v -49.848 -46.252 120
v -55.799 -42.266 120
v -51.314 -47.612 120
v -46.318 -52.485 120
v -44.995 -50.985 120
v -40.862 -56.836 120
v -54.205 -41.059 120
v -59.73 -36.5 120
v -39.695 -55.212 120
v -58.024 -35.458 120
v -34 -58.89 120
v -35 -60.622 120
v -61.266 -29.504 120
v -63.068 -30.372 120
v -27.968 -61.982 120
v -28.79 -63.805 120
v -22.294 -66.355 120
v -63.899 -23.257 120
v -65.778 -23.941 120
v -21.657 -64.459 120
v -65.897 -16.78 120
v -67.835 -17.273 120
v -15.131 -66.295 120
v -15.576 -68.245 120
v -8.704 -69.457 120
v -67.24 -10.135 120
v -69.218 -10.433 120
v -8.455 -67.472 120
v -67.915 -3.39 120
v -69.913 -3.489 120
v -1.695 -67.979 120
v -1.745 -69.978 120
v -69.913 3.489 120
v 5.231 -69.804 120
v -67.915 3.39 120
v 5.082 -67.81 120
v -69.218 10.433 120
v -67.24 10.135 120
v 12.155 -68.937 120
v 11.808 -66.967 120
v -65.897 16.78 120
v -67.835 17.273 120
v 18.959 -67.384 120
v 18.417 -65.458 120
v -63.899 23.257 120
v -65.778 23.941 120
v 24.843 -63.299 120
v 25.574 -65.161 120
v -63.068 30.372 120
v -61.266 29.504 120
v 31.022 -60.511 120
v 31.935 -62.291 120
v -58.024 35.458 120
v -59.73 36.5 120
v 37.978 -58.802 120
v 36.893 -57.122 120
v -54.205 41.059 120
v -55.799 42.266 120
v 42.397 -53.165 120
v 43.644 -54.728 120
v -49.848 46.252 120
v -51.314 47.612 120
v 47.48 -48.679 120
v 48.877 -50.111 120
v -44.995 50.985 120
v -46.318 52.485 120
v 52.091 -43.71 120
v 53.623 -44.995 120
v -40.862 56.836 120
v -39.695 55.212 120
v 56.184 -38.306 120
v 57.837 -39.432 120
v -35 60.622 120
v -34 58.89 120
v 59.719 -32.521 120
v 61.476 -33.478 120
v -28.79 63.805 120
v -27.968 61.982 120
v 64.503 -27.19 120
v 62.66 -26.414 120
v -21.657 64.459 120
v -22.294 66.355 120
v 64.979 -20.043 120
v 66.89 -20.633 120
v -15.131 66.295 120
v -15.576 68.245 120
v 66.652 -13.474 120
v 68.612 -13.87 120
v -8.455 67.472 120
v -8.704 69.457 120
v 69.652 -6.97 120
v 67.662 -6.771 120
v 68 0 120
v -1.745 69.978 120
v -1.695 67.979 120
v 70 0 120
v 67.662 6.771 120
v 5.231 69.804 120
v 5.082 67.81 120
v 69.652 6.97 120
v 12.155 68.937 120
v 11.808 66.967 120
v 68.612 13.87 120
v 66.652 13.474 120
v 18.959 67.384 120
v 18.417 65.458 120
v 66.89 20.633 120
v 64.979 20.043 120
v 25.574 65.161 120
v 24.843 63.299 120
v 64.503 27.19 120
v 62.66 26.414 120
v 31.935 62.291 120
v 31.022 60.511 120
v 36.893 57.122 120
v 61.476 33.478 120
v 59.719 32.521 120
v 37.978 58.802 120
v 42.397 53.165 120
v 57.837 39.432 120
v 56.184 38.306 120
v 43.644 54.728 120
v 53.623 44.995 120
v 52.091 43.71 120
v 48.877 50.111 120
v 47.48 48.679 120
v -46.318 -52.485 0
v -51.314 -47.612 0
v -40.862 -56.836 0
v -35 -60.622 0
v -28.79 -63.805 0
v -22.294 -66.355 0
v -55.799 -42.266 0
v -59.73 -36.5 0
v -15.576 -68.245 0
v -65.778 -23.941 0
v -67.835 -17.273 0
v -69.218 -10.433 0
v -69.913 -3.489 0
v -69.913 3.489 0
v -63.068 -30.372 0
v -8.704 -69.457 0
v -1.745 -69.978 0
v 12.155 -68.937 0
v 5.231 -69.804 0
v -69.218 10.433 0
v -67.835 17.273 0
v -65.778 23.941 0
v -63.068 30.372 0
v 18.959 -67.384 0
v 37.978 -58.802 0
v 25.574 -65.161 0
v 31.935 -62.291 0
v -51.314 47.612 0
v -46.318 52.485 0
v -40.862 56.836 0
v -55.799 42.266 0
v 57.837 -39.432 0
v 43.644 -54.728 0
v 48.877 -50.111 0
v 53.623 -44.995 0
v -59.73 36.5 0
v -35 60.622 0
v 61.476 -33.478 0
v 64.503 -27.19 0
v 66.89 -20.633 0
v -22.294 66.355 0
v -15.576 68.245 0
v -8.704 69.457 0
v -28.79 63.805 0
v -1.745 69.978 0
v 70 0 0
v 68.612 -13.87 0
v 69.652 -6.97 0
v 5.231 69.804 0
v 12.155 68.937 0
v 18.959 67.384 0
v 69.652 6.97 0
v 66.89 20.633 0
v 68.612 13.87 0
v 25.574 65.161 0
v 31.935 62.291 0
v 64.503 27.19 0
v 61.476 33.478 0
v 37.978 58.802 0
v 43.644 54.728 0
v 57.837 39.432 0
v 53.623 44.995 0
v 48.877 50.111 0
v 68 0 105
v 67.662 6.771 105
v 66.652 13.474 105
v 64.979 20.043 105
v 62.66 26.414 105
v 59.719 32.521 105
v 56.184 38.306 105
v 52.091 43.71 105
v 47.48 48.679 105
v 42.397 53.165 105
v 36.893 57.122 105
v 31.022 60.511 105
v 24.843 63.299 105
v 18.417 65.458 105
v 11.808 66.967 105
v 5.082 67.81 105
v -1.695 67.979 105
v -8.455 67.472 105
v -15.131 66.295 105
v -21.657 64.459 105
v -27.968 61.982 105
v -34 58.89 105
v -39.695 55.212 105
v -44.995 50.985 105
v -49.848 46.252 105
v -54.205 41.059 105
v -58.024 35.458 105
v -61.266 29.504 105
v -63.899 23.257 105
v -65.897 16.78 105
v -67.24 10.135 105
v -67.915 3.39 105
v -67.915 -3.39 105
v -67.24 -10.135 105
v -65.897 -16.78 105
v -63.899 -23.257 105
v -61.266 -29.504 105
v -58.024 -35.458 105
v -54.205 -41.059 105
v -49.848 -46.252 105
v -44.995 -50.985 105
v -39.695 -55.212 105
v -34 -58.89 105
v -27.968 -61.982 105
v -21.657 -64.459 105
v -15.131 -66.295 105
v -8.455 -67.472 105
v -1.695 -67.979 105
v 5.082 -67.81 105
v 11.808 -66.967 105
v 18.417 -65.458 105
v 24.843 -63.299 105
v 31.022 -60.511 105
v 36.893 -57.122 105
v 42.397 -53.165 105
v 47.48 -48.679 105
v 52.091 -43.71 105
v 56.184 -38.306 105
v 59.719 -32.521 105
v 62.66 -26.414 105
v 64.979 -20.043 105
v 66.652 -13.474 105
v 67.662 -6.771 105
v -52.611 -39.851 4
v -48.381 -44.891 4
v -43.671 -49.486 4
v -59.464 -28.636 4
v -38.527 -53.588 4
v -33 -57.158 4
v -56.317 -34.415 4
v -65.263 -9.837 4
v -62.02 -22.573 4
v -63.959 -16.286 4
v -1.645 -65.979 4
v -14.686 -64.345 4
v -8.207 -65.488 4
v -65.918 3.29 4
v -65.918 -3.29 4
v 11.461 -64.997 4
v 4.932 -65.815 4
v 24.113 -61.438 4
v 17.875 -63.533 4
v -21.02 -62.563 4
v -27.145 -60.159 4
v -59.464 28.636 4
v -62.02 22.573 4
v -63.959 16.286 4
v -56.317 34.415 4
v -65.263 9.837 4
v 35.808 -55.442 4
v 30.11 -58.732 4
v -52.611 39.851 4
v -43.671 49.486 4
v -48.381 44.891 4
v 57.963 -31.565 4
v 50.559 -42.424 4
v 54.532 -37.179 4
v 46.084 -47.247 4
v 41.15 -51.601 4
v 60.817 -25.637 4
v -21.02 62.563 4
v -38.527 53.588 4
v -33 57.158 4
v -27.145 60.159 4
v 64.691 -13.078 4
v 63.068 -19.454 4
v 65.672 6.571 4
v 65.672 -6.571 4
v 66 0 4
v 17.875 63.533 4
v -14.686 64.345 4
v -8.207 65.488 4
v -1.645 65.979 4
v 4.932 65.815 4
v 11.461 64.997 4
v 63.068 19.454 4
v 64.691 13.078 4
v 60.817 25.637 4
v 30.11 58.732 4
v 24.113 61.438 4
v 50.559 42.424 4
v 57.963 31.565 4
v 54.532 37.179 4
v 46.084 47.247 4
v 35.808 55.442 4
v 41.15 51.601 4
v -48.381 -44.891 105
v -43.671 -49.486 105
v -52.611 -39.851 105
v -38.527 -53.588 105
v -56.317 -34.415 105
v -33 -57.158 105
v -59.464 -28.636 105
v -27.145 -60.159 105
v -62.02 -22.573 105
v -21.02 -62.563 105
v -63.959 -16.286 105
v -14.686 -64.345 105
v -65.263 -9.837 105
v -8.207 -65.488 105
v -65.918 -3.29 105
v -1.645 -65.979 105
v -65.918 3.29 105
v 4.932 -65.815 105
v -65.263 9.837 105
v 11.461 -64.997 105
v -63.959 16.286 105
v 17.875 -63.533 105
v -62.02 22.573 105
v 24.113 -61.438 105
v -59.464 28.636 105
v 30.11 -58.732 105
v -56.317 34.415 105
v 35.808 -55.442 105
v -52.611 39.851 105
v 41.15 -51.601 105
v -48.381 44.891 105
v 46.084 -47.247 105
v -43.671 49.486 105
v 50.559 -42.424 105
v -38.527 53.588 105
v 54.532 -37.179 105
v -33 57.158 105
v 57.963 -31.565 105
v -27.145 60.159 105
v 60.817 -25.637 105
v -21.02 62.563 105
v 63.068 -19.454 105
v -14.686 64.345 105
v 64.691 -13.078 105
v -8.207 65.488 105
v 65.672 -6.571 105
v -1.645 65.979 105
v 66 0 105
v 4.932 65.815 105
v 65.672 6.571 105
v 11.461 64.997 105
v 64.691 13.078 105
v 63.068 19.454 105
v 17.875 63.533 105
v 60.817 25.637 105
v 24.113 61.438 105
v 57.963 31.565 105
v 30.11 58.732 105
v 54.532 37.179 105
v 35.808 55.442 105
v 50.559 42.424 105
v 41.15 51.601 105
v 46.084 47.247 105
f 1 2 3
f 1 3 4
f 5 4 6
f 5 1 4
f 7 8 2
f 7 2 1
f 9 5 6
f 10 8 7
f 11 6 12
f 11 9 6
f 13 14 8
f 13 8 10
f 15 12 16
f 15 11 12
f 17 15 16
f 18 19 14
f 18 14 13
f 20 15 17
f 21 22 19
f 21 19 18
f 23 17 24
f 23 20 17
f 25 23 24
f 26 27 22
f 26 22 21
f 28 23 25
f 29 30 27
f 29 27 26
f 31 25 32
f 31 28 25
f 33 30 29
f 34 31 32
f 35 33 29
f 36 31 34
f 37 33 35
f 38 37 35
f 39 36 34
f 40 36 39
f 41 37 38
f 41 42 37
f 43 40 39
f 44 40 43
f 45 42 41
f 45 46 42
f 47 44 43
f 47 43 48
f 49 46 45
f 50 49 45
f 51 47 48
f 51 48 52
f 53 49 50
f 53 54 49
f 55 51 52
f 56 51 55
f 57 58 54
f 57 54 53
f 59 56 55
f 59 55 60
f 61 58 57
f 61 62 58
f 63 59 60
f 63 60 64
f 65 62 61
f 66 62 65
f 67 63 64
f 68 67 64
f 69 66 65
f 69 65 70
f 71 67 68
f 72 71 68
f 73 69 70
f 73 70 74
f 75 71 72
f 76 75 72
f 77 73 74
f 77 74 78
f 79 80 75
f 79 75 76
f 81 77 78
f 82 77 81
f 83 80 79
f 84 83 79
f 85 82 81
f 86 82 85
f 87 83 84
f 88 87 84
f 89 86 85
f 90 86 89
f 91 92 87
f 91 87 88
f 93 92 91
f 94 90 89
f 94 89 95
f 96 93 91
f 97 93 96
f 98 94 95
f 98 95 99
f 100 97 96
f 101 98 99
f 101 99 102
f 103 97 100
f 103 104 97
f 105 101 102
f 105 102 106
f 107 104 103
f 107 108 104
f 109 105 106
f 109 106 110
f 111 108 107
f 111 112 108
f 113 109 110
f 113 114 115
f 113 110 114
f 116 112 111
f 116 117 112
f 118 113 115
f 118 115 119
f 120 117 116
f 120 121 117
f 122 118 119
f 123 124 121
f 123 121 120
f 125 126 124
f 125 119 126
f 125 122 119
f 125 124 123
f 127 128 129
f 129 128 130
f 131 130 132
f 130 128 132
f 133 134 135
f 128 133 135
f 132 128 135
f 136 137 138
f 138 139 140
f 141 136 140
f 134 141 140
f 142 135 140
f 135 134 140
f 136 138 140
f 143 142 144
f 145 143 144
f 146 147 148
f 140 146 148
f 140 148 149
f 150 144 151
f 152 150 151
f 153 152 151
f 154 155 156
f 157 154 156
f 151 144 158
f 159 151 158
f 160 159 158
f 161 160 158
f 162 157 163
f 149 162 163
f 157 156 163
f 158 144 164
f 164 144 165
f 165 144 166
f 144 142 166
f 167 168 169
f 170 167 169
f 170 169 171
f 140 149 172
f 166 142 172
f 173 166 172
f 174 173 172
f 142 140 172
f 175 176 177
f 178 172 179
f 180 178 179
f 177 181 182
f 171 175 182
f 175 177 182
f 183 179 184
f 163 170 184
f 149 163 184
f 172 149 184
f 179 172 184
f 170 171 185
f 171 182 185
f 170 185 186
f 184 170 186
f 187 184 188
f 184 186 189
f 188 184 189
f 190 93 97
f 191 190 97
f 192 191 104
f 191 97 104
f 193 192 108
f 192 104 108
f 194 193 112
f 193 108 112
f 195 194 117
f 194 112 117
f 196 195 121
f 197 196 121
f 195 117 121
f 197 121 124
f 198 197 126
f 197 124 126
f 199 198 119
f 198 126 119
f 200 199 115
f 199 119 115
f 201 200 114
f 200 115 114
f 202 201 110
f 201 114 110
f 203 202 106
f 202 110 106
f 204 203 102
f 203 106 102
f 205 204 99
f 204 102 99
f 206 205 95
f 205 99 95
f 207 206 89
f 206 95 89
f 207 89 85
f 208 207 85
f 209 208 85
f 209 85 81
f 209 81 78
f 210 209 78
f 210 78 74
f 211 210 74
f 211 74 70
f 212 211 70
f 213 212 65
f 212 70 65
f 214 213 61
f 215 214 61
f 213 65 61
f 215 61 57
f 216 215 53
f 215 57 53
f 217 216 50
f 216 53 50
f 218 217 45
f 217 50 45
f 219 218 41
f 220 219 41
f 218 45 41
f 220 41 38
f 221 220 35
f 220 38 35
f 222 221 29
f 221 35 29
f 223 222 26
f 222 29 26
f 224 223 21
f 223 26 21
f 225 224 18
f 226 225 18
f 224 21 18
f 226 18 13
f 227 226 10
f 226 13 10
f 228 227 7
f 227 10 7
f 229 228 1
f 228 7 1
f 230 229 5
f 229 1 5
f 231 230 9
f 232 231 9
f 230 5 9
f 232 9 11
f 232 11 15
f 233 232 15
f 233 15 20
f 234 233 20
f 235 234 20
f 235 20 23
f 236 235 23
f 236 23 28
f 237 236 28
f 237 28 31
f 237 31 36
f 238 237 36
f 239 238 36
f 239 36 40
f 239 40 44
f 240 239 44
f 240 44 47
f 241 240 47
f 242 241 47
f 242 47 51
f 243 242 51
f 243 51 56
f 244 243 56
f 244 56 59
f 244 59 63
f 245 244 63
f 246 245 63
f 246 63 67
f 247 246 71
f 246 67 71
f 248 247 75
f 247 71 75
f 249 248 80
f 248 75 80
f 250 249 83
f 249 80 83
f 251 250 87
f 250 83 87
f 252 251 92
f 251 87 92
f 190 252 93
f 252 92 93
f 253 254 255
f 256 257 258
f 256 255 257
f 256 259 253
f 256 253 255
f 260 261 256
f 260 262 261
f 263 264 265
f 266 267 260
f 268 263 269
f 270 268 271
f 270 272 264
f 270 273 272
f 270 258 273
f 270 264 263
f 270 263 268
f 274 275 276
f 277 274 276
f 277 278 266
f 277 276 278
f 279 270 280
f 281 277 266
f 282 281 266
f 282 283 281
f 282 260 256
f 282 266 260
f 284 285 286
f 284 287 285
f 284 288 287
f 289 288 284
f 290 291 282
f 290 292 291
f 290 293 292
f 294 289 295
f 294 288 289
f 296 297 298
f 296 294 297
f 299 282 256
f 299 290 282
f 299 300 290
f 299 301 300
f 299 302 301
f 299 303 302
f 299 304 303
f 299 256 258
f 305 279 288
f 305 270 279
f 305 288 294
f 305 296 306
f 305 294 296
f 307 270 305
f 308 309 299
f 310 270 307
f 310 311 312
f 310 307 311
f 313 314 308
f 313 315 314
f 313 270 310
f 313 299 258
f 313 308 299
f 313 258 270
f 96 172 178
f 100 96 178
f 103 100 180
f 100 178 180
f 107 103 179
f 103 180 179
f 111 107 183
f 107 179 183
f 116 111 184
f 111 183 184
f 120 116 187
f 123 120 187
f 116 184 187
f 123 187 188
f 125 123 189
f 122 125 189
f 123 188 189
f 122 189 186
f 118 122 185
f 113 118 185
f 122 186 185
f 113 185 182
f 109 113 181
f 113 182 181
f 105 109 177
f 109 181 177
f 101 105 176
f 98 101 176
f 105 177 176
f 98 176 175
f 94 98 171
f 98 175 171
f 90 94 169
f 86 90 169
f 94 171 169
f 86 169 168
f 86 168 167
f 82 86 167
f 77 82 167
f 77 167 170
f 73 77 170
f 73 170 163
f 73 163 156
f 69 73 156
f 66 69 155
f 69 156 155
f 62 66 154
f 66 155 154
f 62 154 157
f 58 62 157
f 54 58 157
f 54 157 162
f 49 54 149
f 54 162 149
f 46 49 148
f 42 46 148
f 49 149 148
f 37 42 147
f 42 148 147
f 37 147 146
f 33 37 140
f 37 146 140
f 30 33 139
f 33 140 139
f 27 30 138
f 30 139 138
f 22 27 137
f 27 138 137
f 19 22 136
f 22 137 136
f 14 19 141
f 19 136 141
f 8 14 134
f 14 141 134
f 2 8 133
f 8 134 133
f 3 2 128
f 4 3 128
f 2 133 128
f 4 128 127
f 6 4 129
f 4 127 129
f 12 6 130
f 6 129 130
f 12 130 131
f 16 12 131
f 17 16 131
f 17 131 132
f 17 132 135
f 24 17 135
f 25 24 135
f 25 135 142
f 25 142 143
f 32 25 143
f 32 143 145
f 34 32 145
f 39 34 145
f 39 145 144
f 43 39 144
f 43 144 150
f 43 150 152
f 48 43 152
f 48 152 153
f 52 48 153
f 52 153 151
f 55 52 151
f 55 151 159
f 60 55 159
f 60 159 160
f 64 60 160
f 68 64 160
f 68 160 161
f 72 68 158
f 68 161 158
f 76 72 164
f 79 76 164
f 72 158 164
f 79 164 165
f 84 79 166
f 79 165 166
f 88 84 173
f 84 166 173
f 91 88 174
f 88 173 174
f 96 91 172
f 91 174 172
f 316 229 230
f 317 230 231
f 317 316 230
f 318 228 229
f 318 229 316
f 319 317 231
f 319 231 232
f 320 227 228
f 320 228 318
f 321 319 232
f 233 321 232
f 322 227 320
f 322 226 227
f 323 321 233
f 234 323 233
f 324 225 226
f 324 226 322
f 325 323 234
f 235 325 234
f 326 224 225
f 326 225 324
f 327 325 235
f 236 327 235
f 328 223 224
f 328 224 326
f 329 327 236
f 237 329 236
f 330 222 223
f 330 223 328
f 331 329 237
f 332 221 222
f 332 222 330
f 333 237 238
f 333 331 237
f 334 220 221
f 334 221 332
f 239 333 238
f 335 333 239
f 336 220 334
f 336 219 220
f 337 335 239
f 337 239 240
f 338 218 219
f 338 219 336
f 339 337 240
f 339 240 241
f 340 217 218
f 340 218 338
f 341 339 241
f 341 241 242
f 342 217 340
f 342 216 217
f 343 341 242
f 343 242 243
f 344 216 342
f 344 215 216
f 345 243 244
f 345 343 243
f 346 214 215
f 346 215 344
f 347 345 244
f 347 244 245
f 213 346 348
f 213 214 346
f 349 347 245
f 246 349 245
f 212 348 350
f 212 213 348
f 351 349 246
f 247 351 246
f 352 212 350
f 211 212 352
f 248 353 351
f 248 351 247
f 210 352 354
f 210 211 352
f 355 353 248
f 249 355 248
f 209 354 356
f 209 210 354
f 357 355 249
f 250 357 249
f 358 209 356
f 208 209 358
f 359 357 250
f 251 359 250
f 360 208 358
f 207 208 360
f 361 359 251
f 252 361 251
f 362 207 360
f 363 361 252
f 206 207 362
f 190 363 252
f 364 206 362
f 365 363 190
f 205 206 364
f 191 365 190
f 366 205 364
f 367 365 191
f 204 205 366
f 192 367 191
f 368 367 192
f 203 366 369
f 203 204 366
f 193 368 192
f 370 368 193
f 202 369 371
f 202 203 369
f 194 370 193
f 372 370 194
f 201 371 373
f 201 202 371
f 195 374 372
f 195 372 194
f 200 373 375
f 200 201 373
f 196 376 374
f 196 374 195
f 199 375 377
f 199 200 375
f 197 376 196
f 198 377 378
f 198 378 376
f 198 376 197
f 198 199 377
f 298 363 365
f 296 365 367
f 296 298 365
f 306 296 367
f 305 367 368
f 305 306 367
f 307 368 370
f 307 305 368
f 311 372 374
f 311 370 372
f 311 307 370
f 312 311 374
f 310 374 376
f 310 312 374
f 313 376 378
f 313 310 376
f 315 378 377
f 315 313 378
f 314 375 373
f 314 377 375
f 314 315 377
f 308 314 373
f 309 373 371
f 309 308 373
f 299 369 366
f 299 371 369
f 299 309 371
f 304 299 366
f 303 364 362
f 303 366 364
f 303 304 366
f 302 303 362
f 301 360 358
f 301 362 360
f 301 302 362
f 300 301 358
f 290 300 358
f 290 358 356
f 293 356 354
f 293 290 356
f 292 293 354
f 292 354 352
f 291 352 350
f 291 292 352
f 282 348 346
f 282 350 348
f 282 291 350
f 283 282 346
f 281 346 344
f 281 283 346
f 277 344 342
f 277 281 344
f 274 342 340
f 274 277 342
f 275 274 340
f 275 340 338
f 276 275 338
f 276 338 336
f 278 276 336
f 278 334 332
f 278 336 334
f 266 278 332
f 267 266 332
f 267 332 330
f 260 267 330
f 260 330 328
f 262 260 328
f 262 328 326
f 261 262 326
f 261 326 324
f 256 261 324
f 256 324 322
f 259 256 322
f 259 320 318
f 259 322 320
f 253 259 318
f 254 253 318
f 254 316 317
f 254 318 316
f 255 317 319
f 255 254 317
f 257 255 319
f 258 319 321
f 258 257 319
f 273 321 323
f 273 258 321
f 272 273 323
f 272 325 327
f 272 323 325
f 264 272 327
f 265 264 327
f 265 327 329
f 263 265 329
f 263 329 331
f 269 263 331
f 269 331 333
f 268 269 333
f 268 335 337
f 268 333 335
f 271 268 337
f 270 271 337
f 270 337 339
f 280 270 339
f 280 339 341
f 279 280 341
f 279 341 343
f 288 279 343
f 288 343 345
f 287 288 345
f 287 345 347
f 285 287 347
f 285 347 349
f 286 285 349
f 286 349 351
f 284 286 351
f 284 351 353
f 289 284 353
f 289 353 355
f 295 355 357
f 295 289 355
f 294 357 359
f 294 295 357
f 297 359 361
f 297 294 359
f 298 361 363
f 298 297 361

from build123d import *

# Parameters (mm, degrees)
F0_R     = 70
F1_DEPTH = 120
F2_T     = -4
F3_R     = 68
F4_DEPTH = 15


with BuildPart() as f1:
    # F0 (on Top) → F1 (new body)
    with BuildSketch(Plane.XY):
        Circle(F0_R)
    extrude(amount=F1_DEPTH)

    # F2
    f2_openings = [f1.faces().sort_by_distance(p)[0] for p in [
        (0, 0, 120),
    ]]
    offset(amount=F2_T, openings=f2_openings)

    # F3 (on face) → F4 (cut)
    with BuildSketch(Plane.XY.offset(120)):
        Circle(F3_R)
    extrude(amount=-F4_DEPTH, mode=Mode.SUBTRACT)


solid = f1.part
